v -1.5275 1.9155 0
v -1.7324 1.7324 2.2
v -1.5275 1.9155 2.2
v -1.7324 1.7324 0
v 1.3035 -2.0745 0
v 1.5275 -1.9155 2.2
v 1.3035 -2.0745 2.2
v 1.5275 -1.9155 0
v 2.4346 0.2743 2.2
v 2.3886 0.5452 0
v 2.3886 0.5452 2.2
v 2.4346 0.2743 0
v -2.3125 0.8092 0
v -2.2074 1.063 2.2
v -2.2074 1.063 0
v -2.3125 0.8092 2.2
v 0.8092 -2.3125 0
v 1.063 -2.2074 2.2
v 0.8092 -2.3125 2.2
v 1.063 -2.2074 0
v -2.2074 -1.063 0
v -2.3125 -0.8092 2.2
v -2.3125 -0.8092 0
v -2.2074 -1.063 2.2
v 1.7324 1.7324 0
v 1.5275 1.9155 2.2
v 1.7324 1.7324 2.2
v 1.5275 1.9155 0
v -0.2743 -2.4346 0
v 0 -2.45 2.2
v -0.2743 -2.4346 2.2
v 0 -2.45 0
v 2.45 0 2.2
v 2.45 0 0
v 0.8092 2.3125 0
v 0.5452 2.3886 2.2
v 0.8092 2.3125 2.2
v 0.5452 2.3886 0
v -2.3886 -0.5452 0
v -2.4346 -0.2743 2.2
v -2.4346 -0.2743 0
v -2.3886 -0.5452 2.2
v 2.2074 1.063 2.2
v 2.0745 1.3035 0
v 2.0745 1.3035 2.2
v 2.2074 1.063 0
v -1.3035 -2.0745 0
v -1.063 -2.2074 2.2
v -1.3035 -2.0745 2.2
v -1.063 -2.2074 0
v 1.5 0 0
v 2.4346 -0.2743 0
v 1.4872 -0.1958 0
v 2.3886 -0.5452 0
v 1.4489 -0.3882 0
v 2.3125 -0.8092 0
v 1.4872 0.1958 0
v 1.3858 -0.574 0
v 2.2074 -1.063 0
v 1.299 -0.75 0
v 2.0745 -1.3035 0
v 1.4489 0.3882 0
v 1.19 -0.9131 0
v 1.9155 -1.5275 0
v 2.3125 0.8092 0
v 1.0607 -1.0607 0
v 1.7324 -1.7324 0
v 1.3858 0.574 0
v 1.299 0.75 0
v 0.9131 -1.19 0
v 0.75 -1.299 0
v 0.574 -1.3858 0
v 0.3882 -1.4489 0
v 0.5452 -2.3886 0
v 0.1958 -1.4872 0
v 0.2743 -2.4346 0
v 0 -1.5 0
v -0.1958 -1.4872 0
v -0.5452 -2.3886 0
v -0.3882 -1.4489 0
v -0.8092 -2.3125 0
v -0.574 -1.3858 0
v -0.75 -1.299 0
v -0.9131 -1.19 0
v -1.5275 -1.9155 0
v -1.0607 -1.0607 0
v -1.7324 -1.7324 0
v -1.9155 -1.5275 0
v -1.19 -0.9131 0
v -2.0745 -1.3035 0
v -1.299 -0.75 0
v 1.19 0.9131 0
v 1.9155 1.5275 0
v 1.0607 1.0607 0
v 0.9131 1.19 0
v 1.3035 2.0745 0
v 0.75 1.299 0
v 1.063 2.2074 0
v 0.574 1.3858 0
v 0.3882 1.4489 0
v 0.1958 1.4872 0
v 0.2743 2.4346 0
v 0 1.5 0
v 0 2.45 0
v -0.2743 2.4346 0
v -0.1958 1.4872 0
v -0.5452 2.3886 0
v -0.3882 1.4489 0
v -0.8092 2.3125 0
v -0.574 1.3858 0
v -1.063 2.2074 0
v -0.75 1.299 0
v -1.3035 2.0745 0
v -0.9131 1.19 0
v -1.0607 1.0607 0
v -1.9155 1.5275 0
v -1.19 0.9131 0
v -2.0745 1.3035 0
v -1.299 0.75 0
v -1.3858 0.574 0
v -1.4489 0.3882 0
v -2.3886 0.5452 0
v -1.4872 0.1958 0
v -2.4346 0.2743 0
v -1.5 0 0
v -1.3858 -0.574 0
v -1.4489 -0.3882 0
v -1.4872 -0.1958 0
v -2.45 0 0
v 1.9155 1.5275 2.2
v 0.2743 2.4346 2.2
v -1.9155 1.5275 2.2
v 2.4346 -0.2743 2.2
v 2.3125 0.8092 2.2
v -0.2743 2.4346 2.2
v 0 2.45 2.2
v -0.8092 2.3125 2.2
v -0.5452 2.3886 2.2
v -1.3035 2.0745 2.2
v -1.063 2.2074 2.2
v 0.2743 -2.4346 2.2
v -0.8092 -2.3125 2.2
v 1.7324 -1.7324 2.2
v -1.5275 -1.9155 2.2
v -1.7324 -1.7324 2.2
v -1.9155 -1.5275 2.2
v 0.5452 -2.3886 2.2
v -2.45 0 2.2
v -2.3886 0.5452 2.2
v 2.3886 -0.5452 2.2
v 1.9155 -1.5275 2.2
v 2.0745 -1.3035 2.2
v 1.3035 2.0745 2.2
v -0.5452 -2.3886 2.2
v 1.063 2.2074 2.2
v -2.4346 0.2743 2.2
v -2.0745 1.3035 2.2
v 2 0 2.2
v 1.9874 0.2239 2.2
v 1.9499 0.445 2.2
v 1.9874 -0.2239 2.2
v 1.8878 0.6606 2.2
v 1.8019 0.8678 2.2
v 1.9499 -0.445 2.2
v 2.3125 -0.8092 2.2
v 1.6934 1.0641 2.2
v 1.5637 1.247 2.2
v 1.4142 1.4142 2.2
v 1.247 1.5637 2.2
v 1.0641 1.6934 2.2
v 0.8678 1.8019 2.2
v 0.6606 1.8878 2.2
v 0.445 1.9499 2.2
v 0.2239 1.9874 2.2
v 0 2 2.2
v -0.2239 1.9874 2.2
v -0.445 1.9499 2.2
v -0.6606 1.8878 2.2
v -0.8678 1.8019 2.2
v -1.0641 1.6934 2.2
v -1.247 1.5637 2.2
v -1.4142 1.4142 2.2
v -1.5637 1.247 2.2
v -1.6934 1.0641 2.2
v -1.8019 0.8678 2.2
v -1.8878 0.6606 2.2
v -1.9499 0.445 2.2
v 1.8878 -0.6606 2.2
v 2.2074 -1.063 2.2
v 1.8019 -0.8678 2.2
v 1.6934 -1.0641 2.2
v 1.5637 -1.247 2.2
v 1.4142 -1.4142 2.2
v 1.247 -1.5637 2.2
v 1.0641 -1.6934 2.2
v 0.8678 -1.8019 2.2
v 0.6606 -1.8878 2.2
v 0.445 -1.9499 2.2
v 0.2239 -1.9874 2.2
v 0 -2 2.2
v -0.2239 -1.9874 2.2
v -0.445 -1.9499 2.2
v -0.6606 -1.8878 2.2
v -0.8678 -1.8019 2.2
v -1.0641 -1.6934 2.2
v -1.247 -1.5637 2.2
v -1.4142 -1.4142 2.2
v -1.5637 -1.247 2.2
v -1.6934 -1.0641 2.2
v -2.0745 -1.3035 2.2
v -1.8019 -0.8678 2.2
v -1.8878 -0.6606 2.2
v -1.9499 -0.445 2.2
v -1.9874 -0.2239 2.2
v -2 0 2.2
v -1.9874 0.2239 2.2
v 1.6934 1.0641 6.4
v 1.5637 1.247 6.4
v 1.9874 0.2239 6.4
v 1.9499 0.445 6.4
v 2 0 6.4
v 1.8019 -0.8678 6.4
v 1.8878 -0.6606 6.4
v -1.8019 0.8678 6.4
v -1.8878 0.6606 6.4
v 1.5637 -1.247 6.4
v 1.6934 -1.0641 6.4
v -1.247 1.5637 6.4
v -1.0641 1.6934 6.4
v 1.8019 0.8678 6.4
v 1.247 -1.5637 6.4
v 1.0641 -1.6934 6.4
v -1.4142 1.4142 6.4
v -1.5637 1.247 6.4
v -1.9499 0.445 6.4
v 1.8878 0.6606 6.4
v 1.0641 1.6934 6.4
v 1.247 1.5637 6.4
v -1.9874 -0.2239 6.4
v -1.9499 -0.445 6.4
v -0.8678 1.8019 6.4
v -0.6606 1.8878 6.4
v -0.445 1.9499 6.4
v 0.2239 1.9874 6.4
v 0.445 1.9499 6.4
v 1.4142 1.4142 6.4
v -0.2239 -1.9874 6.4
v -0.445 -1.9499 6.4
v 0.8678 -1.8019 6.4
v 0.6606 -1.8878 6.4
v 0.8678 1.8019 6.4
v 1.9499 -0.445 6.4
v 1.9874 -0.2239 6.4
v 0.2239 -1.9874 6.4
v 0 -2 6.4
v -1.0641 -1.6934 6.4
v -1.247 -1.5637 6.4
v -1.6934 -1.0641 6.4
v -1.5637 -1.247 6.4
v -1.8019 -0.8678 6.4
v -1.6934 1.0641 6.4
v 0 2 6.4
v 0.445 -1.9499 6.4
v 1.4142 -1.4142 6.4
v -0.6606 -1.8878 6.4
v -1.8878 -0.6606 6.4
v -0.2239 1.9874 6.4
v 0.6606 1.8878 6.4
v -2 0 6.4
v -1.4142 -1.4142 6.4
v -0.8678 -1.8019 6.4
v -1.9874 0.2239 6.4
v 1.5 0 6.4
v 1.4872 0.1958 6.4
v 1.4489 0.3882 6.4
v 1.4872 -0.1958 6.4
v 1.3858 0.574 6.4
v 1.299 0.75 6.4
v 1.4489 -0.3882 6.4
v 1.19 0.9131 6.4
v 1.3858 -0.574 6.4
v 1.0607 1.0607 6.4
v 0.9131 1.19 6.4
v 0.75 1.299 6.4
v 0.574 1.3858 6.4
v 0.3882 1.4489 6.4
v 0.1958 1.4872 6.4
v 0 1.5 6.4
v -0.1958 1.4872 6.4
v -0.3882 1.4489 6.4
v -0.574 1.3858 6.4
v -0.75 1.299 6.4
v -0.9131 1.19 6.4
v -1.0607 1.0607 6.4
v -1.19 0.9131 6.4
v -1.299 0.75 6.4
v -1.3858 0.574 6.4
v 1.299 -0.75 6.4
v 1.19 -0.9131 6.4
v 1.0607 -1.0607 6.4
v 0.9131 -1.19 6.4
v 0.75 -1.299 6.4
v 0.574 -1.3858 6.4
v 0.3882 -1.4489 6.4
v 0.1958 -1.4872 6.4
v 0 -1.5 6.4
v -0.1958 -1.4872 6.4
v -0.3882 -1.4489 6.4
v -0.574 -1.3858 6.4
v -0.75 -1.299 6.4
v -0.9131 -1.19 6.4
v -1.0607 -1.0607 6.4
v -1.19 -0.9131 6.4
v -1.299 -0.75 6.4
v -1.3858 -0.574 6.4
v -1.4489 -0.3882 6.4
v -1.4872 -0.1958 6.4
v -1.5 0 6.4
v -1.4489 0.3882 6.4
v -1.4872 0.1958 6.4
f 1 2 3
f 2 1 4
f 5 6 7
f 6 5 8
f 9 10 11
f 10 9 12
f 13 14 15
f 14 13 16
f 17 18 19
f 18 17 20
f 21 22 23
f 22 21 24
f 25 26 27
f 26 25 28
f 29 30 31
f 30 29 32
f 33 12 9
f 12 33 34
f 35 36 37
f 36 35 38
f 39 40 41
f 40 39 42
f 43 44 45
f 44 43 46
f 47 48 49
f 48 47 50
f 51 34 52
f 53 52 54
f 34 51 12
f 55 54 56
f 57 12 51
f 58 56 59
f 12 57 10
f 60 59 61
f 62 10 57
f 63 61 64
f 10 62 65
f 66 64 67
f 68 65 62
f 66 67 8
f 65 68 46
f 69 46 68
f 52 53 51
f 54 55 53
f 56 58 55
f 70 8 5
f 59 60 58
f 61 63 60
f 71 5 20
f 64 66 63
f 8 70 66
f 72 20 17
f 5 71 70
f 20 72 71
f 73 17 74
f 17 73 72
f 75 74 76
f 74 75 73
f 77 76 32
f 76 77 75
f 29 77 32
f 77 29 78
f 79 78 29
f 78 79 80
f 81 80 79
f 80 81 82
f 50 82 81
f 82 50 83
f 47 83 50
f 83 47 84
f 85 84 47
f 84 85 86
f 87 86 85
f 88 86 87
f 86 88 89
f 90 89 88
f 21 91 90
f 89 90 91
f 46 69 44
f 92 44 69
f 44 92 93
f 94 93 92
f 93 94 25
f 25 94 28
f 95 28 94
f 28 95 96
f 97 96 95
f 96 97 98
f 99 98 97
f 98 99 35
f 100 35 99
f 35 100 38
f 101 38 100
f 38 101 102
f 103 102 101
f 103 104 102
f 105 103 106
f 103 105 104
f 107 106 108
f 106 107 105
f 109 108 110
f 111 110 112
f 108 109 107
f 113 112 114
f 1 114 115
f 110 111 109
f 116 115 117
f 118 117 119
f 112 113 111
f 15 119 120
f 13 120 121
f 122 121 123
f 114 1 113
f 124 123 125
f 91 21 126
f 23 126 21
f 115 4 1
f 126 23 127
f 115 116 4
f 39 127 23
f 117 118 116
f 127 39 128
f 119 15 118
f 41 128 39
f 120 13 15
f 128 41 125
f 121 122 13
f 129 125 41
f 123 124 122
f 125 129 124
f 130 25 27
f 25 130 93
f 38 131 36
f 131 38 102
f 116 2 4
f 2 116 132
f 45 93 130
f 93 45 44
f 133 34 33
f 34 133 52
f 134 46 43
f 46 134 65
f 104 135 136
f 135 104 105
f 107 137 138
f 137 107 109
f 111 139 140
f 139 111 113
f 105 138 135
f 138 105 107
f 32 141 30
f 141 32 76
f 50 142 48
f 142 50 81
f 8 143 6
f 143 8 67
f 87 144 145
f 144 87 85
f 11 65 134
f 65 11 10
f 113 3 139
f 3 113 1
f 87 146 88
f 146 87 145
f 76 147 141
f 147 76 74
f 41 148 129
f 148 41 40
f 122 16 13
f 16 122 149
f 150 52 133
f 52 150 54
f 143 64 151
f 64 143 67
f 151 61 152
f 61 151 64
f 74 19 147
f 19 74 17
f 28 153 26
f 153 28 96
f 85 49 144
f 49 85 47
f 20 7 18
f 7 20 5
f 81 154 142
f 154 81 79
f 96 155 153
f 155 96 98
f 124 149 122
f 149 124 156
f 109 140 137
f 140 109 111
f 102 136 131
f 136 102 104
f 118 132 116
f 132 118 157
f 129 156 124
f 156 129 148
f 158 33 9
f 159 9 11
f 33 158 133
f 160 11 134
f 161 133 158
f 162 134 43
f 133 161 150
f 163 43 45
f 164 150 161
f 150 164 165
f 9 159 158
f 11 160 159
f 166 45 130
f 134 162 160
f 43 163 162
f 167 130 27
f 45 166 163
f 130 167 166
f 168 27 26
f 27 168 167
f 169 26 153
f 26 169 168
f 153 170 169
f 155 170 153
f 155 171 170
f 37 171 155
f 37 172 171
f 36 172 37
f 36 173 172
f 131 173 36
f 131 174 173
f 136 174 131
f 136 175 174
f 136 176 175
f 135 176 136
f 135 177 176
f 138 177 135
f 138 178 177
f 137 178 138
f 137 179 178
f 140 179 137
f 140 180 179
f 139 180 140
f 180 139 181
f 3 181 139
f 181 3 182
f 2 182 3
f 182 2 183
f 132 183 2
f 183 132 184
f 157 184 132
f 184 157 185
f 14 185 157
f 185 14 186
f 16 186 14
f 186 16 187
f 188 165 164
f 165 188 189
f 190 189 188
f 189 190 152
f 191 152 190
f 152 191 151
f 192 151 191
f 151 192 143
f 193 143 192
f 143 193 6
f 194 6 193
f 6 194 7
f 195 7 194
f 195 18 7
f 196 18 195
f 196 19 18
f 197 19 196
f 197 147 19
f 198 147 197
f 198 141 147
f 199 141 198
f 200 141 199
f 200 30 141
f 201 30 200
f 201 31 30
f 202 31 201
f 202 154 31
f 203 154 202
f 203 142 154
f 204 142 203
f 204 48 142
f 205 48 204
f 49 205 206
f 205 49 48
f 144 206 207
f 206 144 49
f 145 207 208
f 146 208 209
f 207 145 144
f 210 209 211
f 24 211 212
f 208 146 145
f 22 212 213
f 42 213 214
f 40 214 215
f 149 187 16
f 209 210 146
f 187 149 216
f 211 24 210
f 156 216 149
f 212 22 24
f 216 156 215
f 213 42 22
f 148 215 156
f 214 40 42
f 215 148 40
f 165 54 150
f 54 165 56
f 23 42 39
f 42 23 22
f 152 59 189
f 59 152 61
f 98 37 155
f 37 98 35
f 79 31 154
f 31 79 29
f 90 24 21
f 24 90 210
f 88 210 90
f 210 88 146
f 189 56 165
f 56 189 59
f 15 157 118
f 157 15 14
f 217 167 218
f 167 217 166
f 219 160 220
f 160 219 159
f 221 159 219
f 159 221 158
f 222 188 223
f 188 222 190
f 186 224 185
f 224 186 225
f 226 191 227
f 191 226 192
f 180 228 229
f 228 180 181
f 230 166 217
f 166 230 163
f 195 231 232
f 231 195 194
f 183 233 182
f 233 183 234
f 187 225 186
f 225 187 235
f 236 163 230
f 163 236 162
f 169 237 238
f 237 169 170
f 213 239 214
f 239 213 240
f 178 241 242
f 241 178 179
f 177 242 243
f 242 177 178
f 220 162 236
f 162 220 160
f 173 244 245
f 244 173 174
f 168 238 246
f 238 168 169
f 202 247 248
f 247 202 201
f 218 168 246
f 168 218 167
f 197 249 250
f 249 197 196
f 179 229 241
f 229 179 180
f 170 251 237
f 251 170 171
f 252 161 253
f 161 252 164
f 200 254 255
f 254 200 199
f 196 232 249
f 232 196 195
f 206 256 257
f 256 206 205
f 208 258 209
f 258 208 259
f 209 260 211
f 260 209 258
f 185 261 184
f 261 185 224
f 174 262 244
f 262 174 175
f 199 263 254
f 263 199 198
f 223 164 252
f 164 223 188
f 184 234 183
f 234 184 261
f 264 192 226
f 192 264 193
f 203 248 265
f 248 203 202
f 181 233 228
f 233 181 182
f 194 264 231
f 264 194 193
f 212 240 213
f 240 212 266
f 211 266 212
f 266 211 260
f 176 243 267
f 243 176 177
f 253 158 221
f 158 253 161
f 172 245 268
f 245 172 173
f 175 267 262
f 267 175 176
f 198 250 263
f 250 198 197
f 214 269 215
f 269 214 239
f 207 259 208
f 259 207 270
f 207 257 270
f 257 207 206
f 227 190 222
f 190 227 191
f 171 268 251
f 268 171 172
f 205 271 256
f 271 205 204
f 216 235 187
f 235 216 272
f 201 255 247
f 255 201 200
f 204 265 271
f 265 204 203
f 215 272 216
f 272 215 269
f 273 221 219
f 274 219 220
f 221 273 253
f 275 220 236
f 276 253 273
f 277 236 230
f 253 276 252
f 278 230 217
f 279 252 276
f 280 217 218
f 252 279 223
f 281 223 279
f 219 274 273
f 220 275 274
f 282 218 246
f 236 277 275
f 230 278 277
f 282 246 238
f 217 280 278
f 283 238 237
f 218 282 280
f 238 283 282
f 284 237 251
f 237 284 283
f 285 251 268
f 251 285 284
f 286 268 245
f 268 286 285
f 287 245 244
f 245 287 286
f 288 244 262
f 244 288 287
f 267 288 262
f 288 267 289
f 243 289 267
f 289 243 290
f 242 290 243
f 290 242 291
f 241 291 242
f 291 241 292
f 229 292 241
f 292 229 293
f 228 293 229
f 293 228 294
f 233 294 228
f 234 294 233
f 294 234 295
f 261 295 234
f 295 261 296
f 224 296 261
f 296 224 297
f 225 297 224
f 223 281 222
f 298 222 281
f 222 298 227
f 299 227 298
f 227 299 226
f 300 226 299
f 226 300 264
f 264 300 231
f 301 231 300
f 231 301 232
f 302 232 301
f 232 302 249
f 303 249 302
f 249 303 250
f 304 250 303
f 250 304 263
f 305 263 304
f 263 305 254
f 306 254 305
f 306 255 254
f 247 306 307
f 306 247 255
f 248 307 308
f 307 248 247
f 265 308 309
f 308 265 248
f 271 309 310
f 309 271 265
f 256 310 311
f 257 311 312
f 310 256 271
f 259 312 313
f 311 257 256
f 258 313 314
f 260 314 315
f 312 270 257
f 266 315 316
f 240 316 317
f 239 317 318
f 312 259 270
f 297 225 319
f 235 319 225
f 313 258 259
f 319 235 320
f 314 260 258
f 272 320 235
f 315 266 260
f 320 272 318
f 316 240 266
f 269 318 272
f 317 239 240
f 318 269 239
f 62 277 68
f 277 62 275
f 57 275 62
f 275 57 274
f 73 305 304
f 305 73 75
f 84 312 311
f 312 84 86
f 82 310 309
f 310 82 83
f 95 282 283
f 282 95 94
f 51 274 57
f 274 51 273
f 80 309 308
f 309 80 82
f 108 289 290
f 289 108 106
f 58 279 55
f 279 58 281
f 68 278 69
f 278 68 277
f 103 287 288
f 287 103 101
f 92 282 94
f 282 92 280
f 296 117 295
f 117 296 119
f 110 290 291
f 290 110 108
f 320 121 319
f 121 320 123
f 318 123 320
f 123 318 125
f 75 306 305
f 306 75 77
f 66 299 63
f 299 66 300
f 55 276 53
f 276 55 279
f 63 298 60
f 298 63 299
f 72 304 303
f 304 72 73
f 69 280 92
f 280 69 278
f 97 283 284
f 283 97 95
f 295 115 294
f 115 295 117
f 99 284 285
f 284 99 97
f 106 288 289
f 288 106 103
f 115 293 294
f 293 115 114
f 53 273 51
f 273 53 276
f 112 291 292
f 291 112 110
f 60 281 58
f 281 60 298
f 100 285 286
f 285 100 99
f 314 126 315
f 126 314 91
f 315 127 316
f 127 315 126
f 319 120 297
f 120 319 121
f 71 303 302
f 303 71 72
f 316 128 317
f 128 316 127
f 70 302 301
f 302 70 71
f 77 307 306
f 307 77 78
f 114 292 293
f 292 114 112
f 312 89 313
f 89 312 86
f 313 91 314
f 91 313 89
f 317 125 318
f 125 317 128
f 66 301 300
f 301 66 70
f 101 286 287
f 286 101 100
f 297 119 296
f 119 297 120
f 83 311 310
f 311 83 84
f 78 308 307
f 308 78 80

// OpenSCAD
// part_id: jup8
// name: Jupiter press-fit spacer
// source_drawing_ids: DRW-012
// units: mm
// revision: 0.1
// SPDX-License-Identifier: MIT

module part_jup8(
    base_d = 4.9,
    mid_d = 4.0,
    top_d = 4.0,
    base_h = 2.2,
    mid_h = 2.2,
    top_h = 2.0,
    bore_d = 3.0
) {
    total_h = base_h + mid_h + top_h;
    difference() {
        union() {
            cylinder(d = base_d, h = base_h, center = false, $fn = 56);
            translate([0, 0, base_h]) cylinder(d = mid_d, h = mid_h, center = false, $fn = 56);
            translate([0, 0, base_h + mid_h]) cylinder(d = top_d, h = top_h, center = false, $fn = 56);
        }
        translate([0, 0, -0.05]) cylinder(d = bore_d, h = total_h + 0.1, $fn = 48);
    }
}

// ---- "main guard" ----
// Default to previewing when opened directly:
if (is_undef(__LIB_MODE__)) {
    part_jup8();
}
